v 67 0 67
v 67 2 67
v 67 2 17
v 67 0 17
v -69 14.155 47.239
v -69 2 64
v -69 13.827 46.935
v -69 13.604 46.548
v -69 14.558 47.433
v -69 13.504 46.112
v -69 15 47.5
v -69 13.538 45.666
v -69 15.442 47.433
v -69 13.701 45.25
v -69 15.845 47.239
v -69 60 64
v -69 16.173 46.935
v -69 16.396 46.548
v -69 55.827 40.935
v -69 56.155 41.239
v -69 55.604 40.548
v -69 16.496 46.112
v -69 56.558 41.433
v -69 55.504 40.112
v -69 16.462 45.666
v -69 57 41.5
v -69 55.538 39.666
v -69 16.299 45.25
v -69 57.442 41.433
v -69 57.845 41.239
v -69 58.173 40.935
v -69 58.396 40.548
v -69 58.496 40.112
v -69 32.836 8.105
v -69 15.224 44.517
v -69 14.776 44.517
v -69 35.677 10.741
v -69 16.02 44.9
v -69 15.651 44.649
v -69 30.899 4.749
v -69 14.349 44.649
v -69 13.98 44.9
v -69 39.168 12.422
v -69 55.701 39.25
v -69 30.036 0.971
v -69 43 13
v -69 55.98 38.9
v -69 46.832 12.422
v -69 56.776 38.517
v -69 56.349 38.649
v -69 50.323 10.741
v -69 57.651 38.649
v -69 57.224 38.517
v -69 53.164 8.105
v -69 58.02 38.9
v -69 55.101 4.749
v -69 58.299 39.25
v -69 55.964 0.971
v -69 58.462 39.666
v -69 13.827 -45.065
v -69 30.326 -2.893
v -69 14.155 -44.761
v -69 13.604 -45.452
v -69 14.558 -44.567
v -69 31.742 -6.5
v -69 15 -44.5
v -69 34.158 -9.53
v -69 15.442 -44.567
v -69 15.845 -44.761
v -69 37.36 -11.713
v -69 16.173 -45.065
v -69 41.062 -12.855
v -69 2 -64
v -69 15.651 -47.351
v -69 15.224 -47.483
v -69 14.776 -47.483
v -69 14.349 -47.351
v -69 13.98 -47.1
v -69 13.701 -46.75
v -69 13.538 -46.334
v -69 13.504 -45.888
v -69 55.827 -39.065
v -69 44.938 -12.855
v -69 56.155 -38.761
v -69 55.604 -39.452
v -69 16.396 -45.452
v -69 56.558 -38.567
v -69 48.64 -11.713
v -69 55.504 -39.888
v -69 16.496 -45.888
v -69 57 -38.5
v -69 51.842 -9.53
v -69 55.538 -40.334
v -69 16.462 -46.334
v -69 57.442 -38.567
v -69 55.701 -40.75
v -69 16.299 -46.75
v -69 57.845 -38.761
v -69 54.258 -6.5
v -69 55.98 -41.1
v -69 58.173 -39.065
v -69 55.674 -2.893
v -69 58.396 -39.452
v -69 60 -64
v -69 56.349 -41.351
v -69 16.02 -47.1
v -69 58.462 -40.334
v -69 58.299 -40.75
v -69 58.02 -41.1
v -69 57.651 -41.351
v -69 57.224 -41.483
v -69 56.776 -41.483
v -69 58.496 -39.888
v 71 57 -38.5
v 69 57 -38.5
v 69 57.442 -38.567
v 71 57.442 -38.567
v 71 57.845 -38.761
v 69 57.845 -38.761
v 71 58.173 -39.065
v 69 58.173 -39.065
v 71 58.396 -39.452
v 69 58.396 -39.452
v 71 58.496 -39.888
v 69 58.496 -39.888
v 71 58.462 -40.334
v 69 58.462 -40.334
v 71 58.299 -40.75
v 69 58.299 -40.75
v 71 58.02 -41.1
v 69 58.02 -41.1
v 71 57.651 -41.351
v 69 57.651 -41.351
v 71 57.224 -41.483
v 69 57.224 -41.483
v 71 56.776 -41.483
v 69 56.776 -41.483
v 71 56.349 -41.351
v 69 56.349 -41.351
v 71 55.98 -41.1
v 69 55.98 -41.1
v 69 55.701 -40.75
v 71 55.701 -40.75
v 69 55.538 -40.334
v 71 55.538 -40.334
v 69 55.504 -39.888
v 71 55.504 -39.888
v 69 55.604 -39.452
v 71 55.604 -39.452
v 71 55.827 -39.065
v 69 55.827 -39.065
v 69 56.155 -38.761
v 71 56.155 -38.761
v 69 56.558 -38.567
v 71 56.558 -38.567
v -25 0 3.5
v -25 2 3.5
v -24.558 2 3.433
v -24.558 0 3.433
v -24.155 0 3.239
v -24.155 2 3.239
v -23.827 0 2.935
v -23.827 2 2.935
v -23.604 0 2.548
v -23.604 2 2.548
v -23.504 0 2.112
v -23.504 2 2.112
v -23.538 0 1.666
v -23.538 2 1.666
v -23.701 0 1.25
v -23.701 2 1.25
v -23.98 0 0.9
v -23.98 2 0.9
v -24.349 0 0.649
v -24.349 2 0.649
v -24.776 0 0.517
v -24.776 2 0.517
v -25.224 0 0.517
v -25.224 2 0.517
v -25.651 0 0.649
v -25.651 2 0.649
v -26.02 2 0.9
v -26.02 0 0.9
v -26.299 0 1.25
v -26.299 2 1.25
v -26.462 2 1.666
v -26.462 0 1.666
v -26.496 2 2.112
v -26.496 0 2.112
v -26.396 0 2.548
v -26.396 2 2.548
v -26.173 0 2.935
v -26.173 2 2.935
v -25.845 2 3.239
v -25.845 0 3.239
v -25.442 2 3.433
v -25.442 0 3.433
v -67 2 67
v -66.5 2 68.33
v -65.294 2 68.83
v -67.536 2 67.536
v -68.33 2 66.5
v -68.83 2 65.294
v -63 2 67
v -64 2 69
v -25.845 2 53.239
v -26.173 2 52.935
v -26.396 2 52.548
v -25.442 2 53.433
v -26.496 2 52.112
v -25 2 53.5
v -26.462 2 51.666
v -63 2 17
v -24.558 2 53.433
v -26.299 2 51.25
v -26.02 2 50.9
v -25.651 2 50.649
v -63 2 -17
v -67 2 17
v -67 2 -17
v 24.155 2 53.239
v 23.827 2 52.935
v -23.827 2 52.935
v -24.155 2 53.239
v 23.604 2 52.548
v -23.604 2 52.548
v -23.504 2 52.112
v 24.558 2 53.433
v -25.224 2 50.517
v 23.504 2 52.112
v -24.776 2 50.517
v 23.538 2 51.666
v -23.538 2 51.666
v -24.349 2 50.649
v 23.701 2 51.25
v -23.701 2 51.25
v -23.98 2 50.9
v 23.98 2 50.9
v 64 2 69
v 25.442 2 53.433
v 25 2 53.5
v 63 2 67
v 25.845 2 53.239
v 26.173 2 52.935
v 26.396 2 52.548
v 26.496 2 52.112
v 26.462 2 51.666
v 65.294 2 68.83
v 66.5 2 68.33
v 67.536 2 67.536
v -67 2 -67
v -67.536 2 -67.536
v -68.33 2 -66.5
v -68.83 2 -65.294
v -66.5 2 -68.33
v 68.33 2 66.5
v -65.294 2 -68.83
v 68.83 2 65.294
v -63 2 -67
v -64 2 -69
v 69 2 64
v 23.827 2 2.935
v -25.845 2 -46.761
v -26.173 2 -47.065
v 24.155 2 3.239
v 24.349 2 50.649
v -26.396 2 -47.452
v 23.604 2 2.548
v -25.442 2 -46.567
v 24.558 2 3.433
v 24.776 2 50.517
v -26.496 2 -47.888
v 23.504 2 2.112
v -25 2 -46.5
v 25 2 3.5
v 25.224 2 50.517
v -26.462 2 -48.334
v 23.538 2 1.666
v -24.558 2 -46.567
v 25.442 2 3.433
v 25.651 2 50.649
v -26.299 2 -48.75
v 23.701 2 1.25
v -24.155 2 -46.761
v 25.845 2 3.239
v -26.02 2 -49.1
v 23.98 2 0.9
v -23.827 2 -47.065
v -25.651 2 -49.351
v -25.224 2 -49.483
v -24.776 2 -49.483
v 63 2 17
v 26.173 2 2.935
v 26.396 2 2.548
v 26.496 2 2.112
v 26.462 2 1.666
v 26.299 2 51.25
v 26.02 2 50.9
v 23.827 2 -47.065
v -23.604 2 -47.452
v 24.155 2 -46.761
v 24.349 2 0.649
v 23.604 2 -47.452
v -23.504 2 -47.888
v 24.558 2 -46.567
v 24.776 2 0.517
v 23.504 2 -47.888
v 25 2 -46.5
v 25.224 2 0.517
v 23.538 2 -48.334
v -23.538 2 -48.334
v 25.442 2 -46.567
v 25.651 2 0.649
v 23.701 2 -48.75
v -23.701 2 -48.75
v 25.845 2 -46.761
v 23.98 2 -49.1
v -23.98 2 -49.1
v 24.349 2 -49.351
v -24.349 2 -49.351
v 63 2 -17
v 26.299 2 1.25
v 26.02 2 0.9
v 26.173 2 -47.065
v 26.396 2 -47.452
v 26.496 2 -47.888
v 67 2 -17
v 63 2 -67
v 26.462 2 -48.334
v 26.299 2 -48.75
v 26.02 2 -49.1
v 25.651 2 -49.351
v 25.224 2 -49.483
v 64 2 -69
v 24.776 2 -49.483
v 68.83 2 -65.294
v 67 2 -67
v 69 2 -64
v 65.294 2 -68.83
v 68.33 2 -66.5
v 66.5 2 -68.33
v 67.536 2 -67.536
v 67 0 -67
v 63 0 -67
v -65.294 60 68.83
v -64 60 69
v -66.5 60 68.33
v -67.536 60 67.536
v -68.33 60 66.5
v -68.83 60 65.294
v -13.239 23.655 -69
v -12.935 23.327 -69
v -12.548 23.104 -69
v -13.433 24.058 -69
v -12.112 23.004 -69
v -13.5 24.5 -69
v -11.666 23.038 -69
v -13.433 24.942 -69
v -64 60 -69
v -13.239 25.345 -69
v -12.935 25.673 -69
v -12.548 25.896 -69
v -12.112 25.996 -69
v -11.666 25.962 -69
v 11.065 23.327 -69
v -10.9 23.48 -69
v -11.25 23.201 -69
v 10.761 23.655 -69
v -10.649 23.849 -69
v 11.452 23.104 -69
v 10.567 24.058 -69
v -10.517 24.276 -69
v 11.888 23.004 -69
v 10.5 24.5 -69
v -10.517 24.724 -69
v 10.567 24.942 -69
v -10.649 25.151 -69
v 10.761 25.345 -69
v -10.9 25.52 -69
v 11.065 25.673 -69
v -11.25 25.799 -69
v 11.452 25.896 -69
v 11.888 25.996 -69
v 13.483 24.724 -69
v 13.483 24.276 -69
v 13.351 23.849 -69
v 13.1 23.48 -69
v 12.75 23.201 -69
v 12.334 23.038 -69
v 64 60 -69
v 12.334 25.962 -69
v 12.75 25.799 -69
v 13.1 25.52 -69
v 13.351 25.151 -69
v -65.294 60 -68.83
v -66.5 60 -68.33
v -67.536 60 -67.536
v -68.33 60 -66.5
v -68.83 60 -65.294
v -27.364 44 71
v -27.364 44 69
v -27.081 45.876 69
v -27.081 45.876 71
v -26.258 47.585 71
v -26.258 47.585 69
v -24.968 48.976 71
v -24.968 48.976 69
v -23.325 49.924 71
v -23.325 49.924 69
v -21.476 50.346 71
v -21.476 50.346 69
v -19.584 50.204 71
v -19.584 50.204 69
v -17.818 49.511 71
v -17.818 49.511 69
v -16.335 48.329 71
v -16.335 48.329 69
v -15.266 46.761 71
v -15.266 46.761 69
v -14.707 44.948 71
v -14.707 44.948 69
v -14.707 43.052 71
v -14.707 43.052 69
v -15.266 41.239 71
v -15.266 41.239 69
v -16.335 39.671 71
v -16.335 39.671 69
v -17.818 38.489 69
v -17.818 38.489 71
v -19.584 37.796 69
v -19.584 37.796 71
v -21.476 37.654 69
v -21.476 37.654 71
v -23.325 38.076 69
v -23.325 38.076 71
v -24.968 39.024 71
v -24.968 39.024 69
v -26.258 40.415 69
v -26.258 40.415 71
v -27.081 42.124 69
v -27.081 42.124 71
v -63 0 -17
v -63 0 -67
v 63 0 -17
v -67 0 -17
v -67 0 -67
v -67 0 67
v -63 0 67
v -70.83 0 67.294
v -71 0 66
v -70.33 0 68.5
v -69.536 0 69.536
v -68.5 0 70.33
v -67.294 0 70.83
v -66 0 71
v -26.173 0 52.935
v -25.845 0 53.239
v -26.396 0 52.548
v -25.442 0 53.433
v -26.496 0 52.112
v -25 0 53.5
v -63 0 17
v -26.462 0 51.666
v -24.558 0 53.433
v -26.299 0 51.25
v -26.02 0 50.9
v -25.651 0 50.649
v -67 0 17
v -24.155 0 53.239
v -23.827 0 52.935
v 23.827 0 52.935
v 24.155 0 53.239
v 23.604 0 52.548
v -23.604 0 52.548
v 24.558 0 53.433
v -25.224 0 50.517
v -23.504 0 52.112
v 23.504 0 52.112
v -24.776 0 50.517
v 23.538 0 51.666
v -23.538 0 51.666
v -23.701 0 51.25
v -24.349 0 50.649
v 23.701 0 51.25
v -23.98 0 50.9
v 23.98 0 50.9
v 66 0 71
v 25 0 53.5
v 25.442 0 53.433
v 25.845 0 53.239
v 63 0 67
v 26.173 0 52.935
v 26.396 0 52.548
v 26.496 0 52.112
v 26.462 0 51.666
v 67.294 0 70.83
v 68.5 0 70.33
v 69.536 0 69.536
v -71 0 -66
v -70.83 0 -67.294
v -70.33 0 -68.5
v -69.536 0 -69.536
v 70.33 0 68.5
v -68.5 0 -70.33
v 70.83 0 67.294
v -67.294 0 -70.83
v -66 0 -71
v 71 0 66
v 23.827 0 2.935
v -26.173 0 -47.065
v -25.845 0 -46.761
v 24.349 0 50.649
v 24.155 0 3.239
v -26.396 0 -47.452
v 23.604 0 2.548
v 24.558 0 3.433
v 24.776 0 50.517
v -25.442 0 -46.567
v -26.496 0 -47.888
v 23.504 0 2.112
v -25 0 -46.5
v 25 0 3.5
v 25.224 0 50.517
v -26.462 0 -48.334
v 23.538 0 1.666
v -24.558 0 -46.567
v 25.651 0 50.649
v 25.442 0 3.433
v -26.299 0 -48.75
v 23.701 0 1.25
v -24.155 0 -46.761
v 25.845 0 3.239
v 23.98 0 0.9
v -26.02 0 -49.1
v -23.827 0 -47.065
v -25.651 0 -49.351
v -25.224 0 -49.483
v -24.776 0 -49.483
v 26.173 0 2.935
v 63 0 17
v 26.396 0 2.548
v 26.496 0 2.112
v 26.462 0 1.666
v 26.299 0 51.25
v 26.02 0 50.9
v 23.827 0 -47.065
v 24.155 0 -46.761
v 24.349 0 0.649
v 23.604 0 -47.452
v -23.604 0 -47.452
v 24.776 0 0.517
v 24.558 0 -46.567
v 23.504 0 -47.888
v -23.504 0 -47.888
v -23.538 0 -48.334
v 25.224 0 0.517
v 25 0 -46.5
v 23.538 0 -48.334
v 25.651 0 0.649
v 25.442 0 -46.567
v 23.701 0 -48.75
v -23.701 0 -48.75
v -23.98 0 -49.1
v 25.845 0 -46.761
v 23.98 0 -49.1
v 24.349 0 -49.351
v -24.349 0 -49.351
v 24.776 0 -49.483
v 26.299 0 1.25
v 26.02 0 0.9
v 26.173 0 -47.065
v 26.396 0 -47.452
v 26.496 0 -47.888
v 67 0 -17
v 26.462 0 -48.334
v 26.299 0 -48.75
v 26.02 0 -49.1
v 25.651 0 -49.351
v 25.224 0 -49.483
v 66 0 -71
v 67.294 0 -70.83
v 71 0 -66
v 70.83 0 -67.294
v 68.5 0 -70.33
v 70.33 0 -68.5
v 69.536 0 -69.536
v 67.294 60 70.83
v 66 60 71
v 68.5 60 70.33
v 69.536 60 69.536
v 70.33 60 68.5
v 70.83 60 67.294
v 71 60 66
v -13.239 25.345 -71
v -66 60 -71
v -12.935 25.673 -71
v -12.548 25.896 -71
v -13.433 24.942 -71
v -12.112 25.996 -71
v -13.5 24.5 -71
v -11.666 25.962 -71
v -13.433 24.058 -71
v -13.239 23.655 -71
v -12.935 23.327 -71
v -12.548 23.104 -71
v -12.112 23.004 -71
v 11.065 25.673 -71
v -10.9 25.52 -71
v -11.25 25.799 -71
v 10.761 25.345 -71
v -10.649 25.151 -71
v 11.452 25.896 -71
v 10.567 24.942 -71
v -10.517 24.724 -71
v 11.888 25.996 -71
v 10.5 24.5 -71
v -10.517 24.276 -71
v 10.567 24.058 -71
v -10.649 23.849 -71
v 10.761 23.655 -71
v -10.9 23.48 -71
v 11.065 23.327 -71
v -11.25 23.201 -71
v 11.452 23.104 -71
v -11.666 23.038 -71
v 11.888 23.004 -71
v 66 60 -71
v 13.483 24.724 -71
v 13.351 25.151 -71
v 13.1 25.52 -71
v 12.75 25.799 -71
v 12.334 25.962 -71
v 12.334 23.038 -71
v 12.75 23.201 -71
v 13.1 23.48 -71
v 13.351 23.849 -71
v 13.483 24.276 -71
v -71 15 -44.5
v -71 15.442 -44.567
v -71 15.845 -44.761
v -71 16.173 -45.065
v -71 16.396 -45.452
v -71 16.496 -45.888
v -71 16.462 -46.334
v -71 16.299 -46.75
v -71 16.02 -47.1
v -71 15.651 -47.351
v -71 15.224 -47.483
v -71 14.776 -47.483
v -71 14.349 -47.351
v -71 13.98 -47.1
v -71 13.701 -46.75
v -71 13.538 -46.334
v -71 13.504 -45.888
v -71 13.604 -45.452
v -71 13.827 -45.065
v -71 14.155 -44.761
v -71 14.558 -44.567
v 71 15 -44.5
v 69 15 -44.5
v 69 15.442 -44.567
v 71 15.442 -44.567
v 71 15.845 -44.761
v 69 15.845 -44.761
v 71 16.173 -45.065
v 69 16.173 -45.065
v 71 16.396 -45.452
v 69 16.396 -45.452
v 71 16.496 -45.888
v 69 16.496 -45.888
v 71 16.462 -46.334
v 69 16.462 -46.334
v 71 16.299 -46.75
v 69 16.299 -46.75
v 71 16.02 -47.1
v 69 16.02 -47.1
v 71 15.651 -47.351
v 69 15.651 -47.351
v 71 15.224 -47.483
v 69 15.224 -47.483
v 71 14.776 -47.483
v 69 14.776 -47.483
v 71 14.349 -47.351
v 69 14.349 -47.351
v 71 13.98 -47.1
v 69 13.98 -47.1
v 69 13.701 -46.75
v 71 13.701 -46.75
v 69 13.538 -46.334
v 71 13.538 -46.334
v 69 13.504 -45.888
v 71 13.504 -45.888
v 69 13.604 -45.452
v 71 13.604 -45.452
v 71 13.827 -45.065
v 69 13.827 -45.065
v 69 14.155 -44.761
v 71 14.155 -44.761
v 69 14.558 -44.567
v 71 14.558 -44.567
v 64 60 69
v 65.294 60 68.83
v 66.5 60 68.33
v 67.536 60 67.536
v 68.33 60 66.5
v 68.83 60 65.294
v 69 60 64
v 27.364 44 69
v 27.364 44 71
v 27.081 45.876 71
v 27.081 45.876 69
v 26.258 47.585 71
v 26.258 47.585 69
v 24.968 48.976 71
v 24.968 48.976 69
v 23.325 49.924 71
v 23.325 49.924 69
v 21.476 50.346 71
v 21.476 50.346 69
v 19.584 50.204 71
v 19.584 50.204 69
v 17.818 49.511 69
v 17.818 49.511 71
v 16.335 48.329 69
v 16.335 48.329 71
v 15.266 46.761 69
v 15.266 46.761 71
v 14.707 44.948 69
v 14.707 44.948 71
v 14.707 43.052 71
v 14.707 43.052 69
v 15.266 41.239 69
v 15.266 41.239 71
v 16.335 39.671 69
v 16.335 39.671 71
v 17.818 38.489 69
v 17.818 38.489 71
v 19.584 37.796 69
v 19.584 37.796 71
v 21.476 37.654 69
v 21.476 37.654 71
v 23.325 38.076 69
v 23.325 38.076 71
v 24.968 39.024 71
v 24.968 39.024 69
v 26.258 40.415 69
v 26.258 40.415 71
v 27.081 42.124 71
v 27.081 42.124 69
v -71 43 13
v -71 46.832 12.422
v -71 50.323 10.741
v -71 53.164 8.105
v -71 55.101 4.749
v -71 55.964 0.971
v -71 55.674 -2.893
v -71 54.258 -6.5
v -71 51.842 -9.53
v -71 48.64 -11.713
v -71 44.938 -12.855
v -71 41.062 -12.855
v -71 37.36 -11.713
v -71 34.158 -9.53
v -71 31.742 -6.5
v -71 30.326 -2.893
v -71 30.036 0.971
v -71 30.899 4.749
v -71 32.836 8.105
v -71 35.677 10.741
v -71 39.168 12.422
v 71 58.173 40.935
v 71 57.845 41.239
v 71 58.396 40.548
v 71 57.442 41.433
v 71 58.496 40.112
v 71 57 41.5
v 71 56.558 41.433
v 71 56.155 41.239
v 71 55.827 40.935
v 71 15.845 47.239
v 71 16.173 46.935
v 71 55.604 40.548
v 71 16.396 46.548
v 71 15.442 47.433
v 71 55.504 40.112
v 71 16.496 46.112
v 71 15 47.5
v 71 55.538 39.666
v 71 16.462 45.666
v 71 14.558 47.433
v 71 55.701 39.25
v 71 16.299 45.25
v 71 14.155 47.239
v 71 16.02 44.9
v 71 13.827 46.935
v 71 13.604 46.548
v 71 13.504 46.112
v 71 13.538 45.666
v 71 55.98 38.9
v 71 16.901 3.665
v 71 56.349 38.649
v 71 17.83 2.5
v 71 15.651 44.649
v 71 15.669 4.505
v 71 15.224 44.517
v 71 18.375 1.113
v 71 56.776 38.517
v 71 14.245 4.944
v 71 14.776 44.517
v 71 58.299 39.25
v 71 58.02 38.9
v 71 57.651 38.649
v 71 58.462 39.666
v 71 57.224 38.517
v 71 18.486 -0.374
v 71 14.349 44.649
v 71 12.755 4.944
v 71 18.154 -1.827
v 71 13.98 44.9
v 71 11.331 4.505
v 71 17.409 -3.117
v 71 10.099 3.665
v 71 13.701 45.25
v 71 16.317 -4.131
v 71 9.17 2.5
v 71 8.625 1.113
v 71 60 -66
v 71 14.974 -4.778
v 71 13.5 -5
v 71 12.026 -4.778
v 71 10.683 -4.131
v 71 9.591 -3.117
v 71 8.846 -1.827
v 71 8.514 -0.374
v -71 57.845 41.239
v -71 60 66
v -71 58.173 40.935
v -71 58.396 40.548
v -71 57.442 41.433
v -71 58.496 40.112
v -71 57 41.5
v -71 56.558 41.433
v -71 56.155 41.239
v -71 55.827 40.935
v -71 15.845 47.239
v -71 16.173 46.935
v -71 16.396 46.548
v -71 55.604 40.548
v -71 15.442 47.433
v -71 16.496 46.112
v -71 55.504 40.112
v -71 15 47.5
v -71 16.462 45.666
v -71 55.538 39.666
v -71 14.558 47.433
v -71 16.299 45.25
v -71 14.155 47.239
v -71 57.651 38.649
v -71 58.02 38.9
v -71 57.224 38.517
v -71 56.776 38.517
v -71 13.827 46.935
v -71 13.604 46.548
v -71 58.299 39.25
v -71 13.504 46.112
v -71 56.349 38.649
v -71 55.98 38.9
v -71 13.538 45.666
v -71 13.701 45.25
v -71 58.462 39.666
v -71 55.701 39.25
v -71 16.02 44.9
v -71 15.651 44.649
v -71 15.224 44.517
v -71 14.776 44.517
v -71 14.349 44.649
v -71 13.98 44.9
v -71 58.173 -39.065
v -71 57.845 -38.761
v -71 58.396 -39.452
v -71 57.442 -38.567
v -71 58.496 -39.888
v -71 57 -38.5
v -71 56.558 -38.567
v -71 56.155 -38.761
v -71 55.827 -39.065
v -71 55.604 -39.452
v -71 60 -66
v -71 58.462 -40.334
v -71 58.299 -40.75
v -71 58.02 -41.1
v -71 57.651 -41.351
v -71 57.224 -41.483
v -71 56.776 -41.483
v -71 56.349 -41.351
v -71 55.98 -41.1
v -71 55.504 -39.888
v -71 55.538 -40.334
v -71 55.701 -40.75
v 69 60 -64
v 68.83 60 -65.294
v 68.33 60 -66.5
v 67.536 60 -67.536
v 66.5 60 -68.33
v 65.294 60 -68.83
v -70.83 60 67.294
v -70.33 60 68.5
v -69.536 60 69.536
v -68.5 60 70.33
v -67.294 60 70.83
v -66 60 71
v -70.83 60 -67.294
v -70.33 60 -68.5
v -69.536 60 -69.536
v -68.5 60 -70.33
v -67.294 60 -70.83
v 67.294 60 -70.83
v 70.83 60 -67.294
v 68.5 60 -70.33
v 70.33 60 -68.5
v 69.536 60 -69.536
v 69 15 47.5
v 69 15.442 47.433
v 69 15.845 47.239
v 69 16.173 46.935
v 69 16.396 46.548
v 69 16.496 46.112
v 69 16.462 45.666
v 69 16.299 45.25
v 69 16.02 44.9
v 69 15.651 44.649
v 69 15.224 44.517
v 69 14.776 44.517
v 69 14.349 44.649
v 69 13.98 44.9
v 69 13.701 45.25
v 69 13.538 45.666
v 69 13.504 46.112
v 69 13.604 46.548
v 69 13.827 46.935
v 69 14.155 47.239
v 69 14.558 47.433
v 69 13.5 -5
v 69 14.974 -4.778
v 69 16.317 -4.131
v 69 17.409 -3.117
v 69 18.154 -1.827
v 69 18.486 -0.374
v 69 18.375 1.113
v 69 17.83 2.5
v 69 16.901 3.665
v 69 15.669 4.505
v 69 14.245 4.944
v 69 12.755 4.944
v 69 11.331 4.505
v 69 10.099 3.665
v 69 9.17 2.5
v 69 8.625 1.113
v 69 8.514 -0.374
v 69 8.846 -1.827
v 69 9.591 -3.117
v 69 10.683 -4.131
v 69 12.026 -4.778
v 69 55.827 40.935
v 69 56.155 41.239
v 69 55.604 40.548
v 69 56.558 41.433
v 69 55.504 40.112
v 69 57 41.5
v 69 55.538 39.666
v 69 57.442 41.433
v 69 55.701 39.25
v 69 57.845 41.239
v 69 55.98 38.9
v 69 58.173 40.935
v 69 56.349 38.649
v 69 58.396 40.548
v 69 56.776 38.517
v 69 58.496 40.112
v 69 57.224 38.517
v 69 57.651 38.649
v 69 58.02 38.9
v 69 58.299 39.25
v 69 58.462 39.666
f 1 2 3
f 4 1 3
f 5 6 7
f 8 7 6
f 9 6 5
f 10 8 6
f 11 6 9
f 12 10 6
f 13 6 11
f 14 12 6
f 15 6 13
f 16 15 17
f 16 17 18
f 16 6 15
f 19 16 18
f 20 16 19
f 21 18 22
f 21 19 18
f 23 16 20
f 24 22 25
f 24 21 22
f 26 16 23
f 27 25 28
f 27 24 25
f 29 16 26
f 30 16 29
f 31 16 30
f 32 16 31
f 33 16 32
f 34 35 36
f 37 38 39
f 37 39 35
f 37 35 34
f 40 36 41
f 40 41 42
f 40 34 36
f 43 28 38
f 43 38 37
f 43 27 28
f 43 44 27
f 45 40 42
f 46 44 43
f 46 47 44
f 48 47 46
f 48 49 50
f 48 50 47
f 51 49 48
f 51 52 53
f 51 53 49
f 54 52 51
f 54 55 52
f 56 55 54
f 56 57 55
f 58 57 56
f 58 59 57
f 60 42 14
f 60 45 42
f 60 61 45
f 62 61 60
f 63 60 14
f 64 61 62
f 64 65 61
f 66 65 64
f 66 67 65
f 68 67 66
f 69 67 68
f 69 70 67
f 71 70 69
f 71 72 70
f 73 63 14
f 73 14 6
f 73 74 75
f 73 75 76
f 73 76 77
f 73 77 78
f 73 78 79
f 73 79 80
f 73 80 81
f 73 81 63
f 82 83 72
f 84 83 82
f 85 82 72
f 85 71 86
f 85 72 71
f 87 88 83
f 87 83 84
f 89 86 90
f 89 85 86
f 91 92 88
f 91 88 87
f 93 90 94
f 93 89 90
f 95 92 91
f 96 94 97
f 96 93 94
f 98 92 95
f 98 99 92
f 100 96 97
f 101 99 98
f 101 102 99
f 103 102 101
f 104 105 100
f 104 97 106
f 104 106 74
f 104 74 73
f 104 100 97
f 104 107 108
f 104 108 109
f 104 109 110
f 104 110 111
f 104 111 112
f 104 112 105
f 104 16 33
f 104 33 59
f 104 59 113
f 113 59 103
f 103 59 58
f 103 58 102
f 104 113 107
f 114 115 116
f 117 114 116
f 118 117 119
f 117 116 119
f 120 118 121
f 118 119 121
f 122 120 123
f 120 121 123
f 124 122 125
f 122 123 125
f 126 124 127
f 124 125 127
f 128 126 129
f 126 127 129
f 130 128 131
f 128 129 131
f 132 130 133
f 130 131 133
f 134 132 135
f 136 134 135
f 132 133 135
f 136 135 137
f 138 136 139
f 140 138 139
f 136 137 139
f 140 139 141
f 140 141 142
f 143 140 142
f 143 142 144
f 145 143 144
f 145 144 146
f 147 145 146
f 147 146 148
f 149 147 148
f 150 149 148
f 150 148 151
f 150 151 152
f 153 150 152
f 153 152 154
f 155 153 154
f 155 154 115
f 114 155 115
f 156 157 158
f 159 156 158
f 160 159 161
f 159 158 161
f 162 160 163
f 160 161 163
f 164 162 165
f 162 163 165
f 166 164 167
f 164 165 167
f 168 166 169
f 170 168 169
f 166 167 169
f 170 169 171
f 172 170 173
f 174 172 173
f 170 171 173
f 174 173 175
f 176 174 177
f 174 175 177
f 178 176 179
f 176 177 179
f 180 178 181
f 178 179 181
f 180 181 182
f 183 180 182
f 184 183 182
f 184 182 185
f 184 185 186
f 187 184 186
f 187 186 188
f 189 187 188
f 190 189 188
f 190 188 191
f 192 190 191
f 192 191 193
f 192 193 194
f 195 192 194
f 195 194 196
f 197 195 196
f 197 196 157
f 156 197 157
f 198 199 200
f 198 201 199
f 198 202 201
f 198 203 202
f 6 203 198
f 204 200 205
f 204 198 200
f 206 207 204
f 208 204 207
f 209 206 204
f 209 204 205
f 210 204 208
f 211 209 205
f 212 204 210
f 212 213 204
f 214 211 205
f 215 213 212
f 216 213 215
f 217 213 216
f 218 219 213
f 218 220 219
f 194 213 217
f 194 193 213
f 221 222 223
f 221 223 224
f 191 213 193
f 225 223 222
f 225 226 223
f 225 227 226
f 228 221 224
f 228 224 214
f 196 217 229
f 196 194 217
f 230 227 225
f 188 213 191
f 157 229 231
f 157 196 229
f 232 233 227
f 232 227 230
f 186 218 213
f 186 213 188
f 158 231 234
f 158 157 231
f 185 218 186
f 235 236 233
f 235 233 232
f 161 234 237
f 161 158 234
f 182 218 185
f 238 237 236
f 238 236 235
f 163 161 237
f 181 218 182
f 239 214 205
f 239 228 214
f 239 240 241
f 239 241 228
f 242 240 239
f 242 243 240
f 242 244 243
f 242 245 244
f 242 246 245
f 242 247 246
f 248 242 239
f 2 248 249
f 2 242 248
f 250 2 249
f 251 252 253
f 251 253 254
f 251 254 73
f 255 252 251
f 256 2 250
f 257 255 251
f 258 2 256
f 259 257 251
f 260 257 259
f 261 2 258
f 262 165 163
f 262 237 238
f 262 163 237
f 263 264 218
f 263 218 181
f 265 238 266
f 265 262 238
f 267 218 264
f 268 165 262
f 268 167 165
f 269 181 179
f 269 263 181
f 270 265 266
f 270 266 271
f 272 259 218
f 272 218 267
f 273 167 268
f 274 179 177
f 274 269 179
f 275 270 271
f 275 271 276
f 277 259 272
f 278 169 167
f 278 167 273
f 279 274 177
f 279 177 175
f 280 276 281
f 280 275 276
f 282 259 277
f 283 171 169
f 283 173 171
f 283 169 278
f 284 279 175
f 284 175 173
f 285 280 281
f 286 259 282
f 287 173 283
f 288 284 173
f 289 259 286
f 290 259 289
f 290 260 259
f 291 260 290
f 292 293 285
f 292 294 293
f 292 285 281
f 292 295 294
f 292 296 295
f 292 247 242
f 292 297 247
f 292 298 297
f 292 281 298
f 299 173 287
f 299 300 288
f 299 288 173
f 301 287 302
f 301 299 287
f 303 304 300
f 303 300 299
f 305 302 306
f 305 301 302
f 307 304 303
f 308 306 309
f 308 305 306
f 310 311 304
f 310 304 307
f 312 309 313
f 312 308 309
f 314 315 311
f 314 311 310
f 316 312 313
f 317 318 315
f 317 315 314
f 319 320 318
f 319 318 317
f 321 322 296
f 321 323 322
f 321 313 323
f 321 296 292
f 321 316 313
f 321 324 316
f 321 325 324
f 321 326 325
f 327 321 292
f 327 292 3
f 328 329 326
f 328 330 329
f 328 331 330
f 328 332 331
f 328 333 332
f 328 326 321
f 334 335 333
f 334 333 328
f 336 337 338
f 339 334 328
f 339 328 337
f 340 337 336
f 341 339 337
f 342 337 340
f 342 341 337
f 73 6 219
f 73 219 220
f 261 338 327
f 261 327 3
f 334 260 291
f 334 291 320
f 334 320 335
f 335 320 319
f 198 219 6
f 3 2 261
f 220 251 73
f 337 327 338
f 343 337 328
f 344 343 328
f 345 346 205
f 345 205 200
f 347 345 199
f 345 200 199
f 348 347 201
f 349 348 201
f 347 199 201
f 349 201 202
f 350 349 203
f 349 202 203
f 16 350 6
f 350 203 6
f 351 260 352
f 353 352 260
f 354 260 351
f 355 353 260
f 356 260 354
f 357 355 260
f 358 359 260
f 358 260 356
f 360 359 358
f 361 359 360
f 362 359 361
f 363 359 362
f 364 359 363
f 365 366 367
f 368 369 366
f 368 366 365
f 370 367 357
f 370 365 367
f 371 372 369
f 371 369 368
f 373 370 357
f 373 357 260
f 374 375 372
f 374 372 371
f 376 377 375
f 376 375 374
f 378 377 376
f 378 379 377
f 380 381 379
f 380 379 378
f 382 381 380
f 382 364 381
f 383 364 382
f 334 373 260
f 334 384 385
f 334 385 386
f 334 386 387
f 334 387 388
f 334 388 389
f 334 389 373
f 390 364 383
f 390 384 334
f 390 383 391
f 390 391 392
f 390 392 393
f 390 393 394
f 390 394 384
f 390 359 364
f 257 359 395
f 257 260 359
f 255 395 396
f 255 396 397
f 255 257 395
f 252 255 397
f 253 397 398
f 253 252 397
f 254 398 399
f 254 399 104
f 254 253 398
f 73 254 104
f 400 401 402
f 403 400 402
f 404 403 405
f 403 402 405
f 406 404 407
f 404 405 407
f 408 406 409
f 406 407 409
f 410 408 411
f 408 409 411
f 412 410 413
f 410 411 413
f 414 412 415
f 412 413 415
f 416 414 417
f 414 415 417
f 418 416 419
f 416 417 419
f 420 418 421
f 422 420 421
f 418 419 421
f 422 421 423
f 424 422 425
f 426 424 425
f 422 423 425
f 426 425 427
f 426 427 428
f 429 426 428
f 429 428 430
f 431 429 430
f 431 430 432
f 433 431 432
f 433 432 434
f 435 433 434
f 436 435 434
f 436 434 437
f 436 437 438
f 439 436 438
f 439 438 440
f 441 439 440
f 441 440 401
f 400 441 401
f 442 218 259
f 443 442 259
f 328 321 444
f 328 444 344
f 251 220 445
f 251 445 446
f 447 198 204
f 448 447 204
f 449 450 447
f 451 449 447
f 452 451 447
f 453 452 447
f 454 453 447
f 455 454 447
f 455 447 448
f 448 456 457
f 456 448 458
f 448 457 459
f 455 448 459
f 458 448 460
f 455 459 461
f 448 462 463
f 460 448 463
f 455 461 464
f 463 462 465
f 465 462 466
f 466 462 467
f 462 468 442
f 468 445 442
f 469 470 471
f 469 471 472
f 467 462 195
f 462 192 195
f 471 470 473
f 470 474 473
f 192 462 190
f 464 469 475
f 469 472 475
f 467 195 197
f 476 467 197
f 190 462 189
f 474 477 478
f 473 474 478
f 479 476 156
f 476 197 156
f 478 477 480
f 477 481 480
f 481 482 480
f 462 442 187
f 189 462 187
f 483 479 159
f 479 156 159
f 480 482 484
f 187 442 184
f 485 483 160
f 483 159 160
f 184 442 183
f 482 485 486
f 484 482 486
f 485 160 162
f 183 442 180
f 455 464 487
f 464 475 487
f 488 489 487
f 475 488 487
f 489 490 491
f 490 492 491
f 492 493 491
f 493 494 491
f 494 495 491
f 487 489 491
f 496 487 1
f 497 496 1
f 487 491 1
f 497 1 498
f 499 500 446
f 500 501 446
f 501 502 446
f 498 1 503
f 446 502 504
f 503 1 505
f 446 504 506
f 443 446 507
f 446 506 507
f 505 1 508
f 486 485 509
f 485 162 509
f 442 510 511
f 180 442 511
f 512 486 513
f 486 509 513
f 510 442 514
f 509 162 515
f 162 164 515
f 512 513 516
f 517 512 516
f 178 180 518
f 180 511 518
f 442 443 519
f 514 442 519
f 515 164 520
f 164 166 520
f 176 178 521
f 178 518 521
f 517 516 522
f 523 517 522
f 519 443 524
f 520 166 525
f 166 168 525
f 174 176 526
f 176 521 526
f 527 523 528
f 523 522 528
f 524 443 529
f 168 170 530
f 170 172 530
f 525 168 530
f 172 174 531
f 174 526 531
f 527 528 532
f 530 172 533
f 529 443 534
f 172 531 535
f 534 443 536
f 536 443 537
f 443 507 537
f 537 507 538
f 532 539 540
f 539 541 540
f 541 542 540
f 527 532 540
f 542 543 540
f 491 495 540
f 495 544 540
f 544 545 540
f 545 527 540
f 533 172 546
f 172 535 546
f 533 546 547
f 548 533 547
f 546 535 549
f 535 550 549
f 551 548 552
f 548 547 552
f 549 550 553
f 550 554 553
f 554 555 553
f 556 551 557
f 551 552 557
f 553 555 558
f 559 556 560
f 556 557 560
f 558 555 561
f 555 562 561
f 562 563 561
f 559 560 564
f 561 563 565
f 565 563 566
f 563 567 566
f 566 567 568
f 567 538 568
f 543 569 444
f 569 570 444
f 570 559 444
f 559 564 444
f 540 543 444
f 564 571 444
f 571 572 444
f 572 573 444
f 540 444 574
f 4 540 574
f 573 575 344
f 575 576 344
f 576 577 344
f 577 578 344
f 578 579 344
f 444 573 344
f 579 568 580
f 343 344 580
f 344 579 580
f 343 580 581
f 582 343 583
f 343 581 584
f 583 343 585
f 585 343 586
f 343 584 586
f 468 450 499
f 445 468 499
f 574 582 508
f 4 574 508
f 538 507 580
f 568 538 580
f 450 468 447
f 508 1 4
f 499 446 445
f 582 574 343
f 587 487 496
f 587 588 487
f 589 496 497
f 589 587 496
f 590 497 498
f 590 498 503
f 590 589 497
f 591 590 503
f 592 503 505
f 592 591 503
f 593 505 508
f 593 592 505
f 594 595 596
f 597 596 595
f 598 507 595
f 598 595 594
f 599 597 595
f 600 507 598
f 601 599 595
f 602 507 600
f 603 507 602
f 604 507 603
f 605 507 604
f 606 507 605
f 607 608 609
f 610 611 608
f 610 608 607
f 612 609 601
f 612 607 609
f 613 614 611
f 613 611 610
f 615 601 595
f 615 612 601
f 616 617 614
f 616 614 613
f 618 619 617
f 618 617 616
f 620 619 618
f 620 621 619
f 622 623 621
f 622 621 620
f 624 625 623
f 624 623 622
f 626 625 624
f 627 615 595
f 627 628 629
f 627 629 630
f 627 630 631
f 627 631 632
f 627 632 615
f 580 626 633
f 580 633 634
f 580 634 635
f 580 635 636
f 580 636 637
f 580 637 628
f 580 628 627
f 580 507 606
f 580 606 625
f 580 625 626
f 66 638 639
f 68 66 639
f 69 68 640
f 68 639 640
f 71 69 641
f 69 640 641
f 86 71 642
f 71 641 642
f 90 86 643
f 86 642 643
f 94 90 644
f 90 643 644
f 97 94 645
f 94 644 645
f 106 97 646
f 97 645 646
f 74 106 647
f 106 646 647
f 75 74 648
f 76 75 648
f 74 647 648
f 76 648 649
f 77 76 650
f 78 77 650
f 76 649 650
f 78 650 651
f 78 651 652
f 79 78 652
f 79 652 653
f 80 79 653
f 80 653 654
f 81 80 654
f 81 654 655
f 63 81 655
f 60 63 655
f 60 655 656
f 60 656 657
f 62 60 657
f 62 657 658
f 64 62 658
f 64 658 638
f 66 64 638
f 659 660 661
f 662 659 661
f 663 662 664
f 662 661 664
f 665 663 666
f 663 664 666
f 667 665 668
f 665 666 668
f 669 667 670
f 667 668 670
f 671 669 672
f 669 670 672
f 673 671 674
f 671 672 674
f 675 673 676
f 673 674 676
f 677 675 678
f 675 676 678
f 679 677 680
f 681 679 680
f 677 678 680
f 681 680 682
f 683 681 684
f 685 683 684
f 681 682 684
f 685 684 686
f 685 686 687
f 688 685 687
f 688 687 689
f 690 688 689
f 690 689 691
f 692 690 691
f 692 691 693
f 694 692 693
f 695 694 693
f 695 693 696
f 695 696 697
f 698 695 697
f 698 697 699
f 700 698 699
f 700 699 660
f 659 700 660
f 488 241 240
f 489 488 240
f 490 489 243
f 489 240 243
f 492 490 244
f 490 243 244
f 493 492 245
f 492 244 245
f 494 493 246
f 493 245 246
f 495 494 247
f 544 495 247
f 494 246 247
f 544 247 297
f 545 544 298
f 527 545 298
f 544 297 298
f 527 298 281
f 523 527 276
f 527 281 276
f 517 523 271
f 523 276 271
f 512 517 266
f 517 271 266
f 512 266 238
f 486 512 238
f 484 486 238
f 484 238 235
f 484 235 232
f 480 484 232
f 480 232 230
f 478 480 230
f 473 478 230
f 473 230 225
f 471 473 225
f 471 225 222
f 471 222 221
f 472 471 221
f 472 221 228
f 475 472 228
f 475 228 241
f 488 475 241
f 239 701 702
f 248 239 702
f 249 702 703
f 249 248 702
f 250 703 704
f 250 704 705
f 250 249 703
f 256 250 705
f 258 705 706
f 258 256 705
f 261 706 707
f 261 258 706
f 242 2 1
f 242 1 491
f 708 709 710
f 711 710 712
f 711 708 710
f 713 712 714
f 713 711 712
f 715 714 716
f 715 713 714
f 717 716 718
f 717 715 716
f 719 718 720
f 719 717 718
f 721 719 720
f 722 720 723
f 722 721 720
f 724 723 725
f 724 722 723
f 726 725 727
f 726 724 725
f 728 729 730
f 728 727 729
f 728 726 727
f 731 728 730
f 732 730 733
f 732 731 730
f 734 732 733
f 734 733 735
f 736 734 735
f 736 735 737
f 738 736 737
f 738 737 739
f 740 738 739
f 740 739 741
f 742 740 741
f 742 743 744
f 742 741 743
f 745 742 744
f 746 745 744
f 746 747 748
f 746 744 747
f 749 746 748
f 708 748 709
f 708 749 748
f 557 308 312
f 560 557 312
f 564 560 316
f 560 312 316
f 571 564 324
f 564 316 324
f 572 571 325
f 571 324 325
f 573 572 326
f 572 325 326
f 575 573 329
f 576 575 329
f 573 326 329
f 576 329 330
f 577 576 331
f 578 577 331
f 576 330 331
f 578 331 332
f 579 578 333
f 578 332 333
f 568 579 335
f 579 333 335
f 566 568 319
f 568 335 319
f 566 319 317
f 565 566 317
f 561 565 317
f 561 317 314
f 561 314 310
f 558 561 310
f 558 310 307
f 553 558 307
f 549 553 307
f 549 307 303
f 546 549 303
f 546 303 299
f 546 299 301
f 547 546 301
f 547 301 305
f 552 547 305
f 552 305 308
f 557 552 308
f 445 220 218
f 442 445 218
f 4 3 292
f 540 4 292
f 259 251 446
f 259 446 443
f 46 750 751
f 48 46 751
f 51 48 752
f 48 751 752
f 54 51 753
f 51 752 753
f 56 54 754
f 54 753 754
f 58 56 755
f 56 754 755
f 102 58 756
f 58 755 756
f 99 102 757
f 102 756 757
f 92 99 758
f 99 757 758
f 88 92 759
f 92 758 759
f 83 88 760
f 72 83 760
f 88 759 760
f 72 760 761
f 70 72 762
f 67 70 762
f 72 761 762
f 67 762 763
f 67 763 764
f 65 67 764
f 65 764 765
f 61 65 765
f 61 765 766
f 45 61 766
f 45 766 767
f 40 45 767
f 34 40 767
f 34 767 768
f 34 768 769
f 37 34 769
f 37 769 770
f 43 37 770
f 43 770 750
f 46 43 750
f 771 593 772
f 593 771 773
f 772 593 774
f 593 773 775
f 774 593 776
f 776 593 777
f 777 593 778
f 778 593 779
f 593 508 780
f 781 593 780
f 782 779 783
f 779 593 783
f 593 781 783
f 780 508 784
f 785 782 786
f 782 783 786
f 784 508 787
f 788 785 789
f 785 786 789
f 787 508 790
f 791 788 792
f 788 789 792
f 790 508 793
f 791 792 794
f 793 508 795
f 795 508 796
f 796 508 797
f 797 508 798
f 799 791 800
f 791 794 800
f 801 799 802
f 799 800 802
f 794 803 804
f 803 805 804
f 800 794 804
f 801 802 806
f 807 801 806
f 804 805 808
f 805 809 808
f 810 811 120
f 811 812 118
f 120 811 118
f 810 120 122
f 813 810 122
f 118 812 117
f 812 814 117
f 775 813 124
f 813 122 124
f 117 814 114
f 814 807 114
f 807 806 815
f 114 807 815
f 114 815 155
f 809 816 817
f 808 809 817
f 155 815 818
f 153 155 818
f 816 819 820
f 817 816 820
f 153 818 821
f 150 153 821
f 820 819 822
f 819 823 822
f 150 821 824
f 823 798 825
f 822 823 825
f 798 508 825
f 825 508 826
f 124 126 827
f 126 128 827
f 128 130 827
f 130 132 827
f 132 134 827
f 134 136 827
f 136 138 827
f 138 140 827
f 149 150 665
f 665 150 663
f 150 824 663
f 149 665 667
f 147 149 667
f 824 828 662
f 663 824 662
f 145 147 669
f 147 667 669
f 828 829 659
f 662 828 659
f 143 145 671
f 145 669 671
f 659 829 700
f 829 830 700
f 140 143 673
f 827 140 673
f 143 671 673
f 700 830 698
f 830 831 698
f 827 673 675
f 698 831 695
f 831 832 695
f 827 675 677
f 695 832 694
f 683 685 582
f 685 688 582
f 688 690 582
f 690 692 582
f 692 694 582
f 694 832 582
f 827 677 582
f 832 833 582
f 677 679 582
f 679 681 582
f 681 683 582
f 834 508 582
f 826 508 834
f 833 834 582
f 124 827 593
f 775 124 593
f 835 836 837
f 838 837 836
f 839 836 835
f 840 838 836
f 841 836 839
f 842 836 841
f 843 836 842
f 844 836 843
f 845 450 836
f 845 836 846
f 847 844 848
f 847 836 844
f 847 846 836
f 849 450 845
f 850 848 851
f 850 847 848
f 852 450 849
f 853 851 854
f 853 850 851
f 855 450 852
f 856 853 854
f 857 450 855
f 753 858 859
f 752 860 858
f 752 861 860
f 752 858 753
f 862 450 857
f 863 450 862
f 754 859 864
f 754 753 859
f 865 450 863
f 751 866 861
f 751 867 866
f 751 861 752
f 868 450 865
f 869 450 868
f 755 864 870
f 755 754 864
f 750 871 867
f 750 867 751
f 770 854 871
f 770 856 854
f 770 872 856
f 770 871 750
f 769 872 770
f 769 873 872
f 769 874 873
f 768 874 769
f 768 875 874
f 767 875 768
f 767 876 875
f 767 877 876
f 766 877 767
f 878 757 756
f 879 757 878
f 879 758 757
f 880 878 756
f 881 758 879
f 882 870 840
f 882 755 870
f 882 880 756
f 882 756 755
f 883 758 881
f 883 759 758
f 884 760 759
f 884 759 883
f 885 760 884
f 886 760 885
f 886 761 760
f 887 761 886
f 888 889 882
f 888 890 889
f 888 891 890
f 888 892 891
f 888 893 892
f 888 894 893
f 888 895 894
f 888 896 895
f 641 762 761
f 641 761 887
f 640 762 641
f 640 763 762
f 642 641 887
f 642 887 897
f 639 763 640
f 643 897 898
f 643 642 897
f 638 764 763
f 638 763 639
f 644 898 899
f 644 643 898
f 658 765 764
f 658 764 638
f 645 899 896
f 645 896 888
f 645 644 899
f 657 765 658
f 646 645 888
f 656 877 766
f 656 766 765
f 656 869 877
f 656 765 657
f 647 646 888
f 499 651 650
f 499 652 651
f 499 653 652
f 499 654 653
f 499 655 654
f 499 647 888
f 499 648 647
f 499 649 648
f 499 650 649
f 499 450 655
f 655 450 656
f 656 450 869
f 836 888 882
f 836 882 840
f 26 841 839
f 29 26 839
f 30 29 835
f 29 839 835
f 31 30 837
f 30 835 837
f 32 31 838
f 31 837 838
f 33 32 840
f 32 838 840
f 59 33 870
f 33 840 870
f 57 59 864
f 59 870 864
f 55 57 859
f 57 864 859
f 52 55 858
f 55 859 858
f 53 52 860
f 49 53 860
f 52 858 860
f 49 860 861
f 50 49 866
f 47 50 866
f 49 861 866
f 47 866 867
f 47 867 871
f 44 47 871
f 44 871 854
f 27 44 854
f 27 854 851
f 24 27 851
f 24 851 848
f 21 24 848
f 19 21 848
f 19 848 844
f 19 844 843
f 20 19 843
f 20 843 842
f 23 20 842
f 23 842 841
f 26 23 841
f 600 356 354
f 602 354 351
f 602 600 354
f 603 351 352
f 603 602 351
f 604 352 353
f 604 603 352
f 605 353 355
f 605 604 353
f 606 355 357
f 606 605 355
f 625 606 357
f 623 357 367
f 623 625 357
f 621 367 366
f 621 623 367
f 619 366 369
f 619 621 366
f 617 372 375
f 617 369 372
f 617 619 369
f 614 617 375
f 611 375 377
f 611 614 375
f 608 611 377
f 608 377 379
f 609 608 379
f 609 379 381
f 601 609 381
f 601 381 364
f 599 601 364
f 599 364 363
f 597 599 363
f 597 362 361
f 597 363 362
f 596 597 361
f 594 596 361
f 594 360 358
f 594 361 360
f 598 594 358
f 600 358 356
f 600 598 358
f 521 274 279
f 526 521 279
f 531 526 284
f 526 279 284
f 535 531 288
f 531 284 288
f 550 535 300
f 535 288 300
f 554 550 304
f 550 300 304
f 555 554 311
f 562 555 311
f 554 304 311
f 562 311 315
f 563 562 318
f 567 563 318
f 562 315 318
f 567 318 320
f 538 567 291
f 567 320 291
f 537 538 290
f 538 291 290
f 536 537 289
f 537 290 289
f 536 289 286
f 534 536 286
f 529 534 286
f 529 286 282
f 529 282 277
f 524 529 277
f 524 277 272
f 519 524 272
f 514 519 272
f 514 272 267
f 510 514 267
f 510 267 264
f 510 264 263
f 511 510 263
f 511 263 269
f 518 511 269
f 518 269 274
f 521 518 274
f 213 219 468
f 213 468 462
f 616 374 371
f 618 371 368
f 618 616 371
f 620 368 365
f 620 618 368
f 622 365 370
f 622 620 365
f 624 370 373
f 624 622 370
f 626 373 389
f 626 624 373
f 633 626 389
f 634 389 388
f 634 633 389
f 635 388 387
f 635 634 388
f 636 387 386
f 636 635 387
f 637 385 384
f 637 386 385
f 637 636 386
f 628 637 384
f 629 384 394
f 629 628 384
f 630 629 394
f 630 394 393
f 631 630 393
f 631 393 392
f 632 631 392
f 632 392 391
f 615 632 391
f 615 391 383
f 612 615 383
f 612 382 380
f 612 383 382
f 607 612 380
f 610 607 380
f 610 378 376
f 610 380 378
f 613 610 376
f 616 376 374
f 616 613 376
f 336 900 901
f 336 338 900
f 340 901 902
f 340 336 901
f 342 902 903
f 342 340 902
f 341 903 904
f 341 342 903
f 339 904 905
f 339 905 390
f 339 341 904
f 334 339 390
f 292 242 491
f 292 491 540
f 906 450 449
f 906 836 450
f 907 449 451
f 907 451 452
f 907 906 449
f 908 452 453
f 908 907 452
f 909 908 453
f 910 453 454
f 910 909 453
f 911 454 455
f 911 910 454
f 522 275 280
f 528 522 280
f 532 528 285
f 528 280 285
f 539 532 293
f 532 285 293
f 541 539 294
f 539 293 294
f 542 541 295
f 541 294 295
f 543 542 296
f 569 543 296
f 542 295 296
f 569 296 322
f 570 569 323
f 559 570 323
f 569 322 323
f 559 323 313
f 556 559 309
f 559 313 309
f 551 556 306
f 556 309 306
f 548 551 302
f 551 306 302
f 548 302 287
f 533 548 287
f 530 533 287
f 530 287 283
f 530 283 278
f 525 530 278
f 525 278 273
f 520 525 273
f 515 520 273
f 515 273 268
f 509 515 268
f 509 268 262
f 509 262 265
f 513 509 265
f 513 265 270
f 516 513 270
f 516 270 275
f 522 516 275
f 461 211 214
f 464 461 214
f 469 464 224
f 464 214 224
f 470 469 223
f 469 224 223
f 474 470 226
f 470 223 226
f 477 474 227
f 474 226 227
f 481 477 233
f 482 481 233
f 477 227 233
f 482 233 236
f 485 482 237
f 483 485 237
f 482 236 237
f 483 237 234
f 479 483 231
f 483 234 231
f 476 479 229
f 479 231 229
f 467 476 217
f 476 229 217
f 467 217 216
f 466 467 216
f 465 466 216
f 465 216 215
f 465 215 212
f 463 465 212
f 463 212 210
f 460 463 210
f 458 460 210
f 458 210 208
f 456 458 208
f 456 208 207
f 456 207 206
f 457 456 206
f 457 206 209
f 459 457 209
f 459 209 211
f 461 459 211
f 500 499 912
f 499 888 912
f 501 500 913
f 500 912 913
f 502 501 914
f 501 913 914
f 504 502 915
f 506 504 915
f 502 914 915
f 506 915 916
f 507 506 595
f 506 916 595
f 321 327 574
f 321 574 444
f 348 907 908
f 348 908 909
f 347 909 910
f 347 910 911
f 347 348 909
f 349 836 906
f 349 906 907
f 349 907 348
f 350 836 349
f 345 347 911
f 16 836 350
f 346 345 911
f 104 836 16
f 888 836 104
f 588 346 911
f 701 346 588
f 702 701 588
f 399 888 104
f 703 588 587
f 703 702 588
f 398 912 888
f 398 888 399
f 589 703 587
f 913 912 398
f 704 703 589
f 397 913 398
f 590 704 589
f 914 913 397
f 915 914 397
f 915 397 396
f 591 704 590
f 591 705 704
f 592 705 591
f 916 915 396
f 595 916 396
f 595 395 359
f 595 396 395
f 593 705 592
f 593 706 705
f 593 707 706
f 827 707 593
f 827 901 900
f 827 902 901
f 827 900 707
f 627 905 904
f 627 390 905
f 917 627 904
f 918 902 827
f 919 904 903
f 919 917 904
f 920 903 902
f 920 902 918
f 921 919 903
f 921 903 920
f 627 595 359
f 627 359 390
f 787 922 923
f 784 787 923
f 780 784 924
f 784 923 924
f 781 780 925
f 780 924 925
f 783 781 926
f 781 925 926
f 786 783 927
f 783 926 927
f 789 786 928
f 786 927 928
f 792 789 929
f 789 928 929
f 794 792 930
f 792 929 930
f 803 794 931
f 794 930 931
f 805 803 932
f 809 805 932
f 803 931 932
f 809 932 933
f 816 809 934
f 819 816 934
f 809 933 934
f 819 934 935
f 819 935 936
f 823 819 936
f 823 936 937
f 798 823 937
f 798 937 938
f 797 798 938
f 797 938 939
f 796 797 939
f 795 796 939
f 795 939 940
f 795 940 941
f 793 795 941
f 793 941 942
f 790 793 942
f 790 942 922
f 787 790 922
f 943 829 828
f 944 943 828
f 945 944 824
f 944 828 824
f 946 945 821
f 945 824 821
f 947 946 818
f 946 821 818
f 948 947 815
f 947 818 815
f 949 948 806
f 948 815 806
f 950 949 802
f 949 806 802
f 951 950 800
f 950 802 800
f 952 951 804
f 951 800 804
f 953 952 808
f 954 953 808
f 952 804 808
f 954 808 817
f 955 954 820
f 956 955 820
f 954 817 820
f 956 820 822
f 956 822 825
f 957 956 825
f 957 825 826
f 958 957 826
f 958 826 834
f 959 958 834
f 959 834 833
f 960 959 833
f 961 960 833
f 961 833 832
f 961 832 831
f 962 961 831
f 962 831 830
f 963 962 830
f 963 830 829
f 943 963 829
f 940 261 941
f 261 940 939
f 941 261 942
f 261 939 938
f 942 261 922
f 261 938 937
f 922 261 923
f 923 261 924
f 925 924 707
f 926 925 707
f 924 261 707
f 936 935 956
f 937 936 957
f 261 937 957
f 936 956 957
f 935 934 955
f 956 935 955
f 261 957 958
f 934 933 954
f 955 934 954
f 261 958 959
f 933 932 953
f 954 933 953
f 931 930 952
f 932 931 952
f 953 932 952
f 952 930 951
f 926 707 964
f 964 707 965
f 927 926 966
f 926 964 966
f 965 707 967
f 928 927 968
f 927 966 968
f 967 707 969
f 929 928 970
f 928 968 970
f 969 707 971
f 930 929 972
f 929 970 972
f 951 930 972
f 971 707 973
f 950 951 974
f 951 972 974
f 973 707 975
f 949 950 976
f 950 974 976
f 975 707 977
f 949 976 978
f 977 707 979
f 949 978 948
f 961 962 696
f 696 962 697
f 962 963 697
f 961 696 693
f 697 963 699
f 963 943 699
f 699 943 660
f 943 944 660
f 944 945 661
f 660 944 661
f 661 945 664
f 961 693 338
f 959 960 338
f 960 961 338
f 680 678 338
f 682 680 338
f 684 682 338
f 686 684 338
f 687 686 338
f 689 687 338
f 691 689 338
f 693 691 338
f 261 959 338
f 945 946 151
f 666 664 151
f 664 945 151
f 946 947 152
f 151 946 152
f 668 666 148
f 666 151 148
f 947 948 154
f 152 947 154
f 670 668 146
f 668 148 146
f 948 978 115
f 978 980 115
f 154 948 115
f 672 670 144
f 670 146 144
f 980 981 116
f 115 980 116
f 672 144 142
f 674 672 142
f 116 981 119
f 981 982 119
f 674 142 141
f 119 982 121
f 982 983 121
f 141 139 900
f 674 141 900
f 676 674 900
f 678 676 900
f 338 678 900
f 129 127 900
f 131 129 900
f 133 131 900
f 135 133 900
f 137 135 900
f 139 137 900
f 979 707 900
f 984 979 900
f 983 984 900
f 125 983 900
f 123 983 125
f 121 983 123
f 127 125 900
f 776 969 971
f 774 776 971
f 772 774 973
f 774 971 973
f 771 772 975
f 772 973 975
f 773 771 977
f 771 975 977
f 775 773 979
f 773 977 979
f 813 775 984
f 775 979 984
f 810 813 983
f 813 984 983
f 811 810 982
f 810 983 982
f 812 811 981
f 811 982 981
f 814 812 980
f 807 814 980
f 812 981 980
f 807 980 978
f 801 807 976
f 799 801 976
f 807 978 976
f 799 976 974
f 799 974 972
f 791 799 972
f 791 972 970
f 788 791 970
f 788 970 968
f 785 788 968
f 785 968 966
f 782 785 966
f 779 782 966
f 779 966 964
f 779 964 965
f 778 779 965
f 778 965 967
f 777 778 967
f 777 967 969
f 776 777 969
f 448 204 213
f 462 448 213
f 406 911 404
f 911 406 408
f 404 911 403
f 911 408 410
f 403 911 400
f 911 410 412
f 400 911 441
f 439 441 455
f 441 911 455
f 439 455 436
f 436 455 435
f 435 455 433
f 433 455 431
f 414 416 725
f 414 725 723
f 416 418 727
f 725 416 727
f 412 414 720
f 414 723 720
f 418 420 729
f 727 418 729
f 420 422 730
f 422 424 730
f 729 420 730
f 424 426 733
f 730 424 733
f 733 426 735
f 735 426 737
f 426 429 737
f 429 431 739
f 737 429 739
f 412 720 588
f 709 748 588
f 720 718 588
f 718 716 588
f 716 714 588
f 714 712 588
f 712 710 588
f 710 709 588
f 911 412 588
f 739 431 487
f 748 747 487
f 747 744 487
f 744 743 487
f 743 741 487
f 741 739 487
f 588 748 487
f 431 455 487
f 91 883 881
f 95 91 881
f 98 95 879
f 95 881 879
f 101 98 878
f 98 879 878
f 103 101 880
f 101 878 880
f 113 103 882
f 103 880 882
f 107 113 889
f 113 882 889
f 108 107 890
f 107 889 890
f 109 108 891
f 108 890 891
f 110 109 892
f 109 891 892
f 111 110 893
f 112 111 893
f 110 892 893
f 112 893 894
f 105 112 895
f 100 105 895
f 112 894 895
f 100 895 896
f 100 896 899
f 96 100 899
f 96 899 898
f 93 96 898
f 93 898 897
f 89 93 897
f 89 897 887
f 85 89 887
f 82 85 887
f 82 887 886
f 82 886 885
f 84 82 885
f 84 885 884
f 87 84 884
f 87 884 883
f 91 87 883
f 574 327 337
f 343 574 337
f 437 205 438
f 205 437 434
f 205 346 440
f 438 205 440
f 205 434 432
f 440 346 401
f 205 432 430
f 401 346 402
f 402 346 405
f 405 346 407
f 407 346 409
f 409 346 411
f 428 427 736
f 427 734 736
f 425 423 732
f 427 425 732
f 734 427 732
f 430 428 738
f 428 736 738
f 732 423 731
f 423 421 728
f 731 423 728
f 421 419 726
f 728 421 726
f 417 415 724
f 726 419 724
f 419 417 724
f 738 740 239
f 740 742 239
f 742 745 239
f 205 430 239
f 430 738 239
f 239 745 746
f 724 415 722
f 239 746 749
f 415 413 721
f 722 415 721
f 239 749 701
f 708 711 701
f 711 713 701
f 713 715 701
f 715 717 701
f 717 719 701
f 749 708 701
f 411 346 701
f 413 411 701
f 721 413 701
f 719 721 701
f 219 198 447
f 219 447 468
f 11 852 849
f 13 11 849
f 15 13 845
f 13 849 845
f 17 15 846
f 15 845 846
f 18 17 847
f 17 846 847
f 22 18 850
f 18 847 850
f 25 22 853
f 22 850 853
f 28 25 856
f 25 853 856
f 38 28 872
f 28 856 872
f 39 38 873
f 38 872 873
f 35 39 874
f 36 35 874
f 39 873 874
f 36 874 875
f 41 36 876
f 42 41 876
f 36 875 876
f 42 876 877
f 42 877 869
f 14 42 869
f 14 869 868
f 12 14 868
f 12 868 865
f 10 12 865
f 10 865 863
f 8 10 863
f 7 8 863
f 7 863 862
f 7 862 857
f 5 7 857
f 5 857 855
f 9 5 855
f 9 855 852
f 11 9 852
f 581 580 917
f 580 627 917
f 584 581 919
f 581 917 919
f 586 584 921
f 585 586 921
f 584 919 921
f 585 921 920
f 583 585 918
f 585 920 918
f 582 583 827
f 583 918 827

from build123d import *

# Parameters (mm, degrees)
SKETCH1_W           = 142
SKETCH1_H           = 142
BOSS_EXTRUDE1_DEPTH = 60
SKETCH3_W           = 138
SKETCH3_H           = 138
CUT_EXTRUDE1_DEPTH  = 58
SKETCH12_W          = 4
SKETCH12_H          = 50
CUT_EXTRUDE8_DEPTH  = 116.956888541
SKETCH13_R          = 1.5
CUT_EXTRUDE9_DEPTH  = 116.956888541
CUT_EXTRUDE6_REACH  = 171.72
SKETCH9_R           = 5
SKETCH14_R          = 6.363961031
CUT_EXTRUDE10_DEPTH = 169.050587622
CUT_EXTRUDE11_REACH = 171.72
SKETCH16_R          = 13
SKETCH18_R          = 1.5
CUT_EXTRUDE12_DEPTH = 170.720358237
FILLET1_R           = 5
SKETCH19_R          = 1.5
CUT_EXTRUDE13_DEPTH = 170.720358237
SKETCH21_R          = 1.5
CUT_EXTRUDE14_DEPTH = 15


with BuildPart() as part:
    # Sketch1 → Boss-Extrude1 (new body)
    with BuildSketch(Plane(origin=(0, 0, 0), x_dir=(1, 0, 0), z_dir=(0, 1, 0))):
        Rectangle(SKETCH1_W, SKETCH1_H)
    extrude(amount=BOSS_EXTRUDE1_DEPTH)

    # Sketch3 → Cut-Extrude1 (cut)
    with BuildSketch(Plane(origin=(0, 60, 0), x_dir=(1, 0, 0), z_dir=(0, 1, 0))):
        Rectangle(SKETCH3_W, SKETCH3_H)
    extrude(amount=-CUT_EXTRUDE1_DEPTH, mode=Mode.SUBTRACT)

    # Sketch12 → Cut-Extrude8 (cut, through all)
    with BuildSketch(Plane(origin=(0, 2, 0), x_dir=(1, 0, 0), z_dir=(0, 1, 0))):
        with Locations((-65, -42)):
            Rectangle(SKETCH12_W, SKETCH12_H)
        with Locations((-65, 42)):
            Rectangle(SKETCH12_W, SKETCH12_H)
    cut_extrude8 = extrude(amount=-CUT_EXTRUDE8_DEPTH, mode=Mode.SUBTRACT)

    # Mirror2: Cut-Extrude8 across plane
    add(cut_extrude8.mirror(Plane(origin=(0, 0, 0), x_dir=(0, 0, 1), z_dir=(1, 0, 0))), mode=Mode.SUBTRACT)

    # Sketch13 → Cut-Extrude9 (cut, through all)
    with BuildSketch(Plane(origin=(0, 2, 0), x_dir=(1, 0, 0), z_dir=(0, 1, 0))):
        with Locations(Location((-25, -2, 0), (0, 0, 270))):
            Circle(SKETCH13_R)
        with Locations(Location((25, -2, 0), (0, 0, 270))):
            Circle(SKETCH13_R)
        with Locations(Location((25, -52, 0), (0, 0, 270))):
            Circle(SKETCH13_R)
        with Locations(Location((-25, -52, 0), (0, 0, 270))):
            Circle(SKETCH13_R)
        with Locations(Location((-25, 48, 0), (0, 0, 270))):
            Circle(SKETCH13_R)
        with Locations(Location((25, 48, 0), (0, 0, 270))):
            Circle(SKETCH13_R)
    extrude(amount=-CUT_EXTRUDE9_DEPTH, mode=Mode.SUBTRACT)

    # Sketch9 → Cut-Extrude6 (cut, up to next)
    with BuildSketch(Plane(origin=(71, 0, 0), x_dir=(0, 0, -1), z_dir=(1, 0, 0)), mode=Mode.PRIVATE) as cut_extrude6_sk1:
        with Locations((0, 13.5)):
            Circle(SKETCH9_R)
    cut_extrude6_tool1 = extrude(cut_extrude6_sk1.sketch, amount=-CUT_EXTRUDE6_REACH, mode=Mode.PRIVATE) & part.part
    add(cut_extrude6_tool1.solids().sort_by_distance((71, 13.5, 0))[0], mode=Mode.SUBTRACT)

    # Sketch14 → Cut-Extrude10 (cut, through all)
    with BuildSketch(Plane(origin=(0, 0, 69), x_dir=(-1, 0, 0), z_dir=(0, 0, -1))):
        with Locations((21, 44)):
            Circle(SKETCH14_R)
    cut_extrude10 = extrude(amount=-CUT_EXTRUDE10_DEPTH, mode=Mode.SUBTRACT)

    # Mirror3: Cut-Extrude10 across plane
    add(cut_extrude10.mirror(Plane(origin=(0, 0, 0), x_dir=(0, 0, 1), z_dir=(1, 0, 0))), mode=Mode.SUBTRACT)

    # Sketch16 → Cut-Extrude11 (cut, up to next)
    with BuildSketch(Plane.ZY.offset(71), mode=Mode.PRIVATE) as cut_extrude11_sk1:
        with Locations((0, 43)):
            Circle(SKETCH16_R)
    cut_extrude11_tool1 = extrude(cut_extrude11_sk1.sketch, amount=-CUT_EXTRUDE11_REACH, mode=Mode.PRIVATE) & part.part
    add(cut_extrude11_tool1.solids().sort_by_distance((-71, 43, 0))[0], mode=Mode.SUBTRACT)

    # Sketch18 → Cut-Extrude12 (cut, through all)
    with BuildSketch(Plane.ZY.offset(71)):
        with Locations((-46, 15)):
            Circle(SKETCH18_R)
        with Locations((46, 15)):
            Circle(SKETCH18_R)
    extrude(amount=-CUT_EXTRUDE12_DEPTH, mode=Mode.SUBTRACT)

    # Fillet1
    fillet1_edges = [part.edges().sort_by_distance(p)[0] for p in [
        (-69, 31, 69),
        (-69, 31, -69),
        (69, 31, -69),
        (69, 31, 69),
        (71, 30, 71),
        (-71, 30, 71),
        (-71, 30, -71),
        (71, 30, -71),
    ]]
    fillet(fillet1_edges, radius=FILLET1_R)

    # Sketch19 → Cut-Extrude13 (cut, through all)
    with BuildSketch(Plane.ZY.offset(71)):
        with Locations((-40, 57)):
            Circle(SKETCH19_R)
        with Locations((40, 57)):
            Circle(SKETCH19_R)
    extrude(amount=-CUT_EXTRUDE13_DEPTH, mode=Mode.SUBTRACT)

    # Sketch21 → Cut-Extrude14 (cut)
    with BuildSketch(Plane.XY.offset(-71)):
        with Locations(Location((-12, 24.5, 0), (0, 0, 180))):
            Circle(SKETCH21_R)
        with Locations(Location((12, 24.5, 0), (0, 0, 180))):
            Circle(SKETCH21_R)
    extrude(amount=CUT_EXTRUDE14_DEPTH, mode=Mode.SUBTRACT)


solid = part.part
